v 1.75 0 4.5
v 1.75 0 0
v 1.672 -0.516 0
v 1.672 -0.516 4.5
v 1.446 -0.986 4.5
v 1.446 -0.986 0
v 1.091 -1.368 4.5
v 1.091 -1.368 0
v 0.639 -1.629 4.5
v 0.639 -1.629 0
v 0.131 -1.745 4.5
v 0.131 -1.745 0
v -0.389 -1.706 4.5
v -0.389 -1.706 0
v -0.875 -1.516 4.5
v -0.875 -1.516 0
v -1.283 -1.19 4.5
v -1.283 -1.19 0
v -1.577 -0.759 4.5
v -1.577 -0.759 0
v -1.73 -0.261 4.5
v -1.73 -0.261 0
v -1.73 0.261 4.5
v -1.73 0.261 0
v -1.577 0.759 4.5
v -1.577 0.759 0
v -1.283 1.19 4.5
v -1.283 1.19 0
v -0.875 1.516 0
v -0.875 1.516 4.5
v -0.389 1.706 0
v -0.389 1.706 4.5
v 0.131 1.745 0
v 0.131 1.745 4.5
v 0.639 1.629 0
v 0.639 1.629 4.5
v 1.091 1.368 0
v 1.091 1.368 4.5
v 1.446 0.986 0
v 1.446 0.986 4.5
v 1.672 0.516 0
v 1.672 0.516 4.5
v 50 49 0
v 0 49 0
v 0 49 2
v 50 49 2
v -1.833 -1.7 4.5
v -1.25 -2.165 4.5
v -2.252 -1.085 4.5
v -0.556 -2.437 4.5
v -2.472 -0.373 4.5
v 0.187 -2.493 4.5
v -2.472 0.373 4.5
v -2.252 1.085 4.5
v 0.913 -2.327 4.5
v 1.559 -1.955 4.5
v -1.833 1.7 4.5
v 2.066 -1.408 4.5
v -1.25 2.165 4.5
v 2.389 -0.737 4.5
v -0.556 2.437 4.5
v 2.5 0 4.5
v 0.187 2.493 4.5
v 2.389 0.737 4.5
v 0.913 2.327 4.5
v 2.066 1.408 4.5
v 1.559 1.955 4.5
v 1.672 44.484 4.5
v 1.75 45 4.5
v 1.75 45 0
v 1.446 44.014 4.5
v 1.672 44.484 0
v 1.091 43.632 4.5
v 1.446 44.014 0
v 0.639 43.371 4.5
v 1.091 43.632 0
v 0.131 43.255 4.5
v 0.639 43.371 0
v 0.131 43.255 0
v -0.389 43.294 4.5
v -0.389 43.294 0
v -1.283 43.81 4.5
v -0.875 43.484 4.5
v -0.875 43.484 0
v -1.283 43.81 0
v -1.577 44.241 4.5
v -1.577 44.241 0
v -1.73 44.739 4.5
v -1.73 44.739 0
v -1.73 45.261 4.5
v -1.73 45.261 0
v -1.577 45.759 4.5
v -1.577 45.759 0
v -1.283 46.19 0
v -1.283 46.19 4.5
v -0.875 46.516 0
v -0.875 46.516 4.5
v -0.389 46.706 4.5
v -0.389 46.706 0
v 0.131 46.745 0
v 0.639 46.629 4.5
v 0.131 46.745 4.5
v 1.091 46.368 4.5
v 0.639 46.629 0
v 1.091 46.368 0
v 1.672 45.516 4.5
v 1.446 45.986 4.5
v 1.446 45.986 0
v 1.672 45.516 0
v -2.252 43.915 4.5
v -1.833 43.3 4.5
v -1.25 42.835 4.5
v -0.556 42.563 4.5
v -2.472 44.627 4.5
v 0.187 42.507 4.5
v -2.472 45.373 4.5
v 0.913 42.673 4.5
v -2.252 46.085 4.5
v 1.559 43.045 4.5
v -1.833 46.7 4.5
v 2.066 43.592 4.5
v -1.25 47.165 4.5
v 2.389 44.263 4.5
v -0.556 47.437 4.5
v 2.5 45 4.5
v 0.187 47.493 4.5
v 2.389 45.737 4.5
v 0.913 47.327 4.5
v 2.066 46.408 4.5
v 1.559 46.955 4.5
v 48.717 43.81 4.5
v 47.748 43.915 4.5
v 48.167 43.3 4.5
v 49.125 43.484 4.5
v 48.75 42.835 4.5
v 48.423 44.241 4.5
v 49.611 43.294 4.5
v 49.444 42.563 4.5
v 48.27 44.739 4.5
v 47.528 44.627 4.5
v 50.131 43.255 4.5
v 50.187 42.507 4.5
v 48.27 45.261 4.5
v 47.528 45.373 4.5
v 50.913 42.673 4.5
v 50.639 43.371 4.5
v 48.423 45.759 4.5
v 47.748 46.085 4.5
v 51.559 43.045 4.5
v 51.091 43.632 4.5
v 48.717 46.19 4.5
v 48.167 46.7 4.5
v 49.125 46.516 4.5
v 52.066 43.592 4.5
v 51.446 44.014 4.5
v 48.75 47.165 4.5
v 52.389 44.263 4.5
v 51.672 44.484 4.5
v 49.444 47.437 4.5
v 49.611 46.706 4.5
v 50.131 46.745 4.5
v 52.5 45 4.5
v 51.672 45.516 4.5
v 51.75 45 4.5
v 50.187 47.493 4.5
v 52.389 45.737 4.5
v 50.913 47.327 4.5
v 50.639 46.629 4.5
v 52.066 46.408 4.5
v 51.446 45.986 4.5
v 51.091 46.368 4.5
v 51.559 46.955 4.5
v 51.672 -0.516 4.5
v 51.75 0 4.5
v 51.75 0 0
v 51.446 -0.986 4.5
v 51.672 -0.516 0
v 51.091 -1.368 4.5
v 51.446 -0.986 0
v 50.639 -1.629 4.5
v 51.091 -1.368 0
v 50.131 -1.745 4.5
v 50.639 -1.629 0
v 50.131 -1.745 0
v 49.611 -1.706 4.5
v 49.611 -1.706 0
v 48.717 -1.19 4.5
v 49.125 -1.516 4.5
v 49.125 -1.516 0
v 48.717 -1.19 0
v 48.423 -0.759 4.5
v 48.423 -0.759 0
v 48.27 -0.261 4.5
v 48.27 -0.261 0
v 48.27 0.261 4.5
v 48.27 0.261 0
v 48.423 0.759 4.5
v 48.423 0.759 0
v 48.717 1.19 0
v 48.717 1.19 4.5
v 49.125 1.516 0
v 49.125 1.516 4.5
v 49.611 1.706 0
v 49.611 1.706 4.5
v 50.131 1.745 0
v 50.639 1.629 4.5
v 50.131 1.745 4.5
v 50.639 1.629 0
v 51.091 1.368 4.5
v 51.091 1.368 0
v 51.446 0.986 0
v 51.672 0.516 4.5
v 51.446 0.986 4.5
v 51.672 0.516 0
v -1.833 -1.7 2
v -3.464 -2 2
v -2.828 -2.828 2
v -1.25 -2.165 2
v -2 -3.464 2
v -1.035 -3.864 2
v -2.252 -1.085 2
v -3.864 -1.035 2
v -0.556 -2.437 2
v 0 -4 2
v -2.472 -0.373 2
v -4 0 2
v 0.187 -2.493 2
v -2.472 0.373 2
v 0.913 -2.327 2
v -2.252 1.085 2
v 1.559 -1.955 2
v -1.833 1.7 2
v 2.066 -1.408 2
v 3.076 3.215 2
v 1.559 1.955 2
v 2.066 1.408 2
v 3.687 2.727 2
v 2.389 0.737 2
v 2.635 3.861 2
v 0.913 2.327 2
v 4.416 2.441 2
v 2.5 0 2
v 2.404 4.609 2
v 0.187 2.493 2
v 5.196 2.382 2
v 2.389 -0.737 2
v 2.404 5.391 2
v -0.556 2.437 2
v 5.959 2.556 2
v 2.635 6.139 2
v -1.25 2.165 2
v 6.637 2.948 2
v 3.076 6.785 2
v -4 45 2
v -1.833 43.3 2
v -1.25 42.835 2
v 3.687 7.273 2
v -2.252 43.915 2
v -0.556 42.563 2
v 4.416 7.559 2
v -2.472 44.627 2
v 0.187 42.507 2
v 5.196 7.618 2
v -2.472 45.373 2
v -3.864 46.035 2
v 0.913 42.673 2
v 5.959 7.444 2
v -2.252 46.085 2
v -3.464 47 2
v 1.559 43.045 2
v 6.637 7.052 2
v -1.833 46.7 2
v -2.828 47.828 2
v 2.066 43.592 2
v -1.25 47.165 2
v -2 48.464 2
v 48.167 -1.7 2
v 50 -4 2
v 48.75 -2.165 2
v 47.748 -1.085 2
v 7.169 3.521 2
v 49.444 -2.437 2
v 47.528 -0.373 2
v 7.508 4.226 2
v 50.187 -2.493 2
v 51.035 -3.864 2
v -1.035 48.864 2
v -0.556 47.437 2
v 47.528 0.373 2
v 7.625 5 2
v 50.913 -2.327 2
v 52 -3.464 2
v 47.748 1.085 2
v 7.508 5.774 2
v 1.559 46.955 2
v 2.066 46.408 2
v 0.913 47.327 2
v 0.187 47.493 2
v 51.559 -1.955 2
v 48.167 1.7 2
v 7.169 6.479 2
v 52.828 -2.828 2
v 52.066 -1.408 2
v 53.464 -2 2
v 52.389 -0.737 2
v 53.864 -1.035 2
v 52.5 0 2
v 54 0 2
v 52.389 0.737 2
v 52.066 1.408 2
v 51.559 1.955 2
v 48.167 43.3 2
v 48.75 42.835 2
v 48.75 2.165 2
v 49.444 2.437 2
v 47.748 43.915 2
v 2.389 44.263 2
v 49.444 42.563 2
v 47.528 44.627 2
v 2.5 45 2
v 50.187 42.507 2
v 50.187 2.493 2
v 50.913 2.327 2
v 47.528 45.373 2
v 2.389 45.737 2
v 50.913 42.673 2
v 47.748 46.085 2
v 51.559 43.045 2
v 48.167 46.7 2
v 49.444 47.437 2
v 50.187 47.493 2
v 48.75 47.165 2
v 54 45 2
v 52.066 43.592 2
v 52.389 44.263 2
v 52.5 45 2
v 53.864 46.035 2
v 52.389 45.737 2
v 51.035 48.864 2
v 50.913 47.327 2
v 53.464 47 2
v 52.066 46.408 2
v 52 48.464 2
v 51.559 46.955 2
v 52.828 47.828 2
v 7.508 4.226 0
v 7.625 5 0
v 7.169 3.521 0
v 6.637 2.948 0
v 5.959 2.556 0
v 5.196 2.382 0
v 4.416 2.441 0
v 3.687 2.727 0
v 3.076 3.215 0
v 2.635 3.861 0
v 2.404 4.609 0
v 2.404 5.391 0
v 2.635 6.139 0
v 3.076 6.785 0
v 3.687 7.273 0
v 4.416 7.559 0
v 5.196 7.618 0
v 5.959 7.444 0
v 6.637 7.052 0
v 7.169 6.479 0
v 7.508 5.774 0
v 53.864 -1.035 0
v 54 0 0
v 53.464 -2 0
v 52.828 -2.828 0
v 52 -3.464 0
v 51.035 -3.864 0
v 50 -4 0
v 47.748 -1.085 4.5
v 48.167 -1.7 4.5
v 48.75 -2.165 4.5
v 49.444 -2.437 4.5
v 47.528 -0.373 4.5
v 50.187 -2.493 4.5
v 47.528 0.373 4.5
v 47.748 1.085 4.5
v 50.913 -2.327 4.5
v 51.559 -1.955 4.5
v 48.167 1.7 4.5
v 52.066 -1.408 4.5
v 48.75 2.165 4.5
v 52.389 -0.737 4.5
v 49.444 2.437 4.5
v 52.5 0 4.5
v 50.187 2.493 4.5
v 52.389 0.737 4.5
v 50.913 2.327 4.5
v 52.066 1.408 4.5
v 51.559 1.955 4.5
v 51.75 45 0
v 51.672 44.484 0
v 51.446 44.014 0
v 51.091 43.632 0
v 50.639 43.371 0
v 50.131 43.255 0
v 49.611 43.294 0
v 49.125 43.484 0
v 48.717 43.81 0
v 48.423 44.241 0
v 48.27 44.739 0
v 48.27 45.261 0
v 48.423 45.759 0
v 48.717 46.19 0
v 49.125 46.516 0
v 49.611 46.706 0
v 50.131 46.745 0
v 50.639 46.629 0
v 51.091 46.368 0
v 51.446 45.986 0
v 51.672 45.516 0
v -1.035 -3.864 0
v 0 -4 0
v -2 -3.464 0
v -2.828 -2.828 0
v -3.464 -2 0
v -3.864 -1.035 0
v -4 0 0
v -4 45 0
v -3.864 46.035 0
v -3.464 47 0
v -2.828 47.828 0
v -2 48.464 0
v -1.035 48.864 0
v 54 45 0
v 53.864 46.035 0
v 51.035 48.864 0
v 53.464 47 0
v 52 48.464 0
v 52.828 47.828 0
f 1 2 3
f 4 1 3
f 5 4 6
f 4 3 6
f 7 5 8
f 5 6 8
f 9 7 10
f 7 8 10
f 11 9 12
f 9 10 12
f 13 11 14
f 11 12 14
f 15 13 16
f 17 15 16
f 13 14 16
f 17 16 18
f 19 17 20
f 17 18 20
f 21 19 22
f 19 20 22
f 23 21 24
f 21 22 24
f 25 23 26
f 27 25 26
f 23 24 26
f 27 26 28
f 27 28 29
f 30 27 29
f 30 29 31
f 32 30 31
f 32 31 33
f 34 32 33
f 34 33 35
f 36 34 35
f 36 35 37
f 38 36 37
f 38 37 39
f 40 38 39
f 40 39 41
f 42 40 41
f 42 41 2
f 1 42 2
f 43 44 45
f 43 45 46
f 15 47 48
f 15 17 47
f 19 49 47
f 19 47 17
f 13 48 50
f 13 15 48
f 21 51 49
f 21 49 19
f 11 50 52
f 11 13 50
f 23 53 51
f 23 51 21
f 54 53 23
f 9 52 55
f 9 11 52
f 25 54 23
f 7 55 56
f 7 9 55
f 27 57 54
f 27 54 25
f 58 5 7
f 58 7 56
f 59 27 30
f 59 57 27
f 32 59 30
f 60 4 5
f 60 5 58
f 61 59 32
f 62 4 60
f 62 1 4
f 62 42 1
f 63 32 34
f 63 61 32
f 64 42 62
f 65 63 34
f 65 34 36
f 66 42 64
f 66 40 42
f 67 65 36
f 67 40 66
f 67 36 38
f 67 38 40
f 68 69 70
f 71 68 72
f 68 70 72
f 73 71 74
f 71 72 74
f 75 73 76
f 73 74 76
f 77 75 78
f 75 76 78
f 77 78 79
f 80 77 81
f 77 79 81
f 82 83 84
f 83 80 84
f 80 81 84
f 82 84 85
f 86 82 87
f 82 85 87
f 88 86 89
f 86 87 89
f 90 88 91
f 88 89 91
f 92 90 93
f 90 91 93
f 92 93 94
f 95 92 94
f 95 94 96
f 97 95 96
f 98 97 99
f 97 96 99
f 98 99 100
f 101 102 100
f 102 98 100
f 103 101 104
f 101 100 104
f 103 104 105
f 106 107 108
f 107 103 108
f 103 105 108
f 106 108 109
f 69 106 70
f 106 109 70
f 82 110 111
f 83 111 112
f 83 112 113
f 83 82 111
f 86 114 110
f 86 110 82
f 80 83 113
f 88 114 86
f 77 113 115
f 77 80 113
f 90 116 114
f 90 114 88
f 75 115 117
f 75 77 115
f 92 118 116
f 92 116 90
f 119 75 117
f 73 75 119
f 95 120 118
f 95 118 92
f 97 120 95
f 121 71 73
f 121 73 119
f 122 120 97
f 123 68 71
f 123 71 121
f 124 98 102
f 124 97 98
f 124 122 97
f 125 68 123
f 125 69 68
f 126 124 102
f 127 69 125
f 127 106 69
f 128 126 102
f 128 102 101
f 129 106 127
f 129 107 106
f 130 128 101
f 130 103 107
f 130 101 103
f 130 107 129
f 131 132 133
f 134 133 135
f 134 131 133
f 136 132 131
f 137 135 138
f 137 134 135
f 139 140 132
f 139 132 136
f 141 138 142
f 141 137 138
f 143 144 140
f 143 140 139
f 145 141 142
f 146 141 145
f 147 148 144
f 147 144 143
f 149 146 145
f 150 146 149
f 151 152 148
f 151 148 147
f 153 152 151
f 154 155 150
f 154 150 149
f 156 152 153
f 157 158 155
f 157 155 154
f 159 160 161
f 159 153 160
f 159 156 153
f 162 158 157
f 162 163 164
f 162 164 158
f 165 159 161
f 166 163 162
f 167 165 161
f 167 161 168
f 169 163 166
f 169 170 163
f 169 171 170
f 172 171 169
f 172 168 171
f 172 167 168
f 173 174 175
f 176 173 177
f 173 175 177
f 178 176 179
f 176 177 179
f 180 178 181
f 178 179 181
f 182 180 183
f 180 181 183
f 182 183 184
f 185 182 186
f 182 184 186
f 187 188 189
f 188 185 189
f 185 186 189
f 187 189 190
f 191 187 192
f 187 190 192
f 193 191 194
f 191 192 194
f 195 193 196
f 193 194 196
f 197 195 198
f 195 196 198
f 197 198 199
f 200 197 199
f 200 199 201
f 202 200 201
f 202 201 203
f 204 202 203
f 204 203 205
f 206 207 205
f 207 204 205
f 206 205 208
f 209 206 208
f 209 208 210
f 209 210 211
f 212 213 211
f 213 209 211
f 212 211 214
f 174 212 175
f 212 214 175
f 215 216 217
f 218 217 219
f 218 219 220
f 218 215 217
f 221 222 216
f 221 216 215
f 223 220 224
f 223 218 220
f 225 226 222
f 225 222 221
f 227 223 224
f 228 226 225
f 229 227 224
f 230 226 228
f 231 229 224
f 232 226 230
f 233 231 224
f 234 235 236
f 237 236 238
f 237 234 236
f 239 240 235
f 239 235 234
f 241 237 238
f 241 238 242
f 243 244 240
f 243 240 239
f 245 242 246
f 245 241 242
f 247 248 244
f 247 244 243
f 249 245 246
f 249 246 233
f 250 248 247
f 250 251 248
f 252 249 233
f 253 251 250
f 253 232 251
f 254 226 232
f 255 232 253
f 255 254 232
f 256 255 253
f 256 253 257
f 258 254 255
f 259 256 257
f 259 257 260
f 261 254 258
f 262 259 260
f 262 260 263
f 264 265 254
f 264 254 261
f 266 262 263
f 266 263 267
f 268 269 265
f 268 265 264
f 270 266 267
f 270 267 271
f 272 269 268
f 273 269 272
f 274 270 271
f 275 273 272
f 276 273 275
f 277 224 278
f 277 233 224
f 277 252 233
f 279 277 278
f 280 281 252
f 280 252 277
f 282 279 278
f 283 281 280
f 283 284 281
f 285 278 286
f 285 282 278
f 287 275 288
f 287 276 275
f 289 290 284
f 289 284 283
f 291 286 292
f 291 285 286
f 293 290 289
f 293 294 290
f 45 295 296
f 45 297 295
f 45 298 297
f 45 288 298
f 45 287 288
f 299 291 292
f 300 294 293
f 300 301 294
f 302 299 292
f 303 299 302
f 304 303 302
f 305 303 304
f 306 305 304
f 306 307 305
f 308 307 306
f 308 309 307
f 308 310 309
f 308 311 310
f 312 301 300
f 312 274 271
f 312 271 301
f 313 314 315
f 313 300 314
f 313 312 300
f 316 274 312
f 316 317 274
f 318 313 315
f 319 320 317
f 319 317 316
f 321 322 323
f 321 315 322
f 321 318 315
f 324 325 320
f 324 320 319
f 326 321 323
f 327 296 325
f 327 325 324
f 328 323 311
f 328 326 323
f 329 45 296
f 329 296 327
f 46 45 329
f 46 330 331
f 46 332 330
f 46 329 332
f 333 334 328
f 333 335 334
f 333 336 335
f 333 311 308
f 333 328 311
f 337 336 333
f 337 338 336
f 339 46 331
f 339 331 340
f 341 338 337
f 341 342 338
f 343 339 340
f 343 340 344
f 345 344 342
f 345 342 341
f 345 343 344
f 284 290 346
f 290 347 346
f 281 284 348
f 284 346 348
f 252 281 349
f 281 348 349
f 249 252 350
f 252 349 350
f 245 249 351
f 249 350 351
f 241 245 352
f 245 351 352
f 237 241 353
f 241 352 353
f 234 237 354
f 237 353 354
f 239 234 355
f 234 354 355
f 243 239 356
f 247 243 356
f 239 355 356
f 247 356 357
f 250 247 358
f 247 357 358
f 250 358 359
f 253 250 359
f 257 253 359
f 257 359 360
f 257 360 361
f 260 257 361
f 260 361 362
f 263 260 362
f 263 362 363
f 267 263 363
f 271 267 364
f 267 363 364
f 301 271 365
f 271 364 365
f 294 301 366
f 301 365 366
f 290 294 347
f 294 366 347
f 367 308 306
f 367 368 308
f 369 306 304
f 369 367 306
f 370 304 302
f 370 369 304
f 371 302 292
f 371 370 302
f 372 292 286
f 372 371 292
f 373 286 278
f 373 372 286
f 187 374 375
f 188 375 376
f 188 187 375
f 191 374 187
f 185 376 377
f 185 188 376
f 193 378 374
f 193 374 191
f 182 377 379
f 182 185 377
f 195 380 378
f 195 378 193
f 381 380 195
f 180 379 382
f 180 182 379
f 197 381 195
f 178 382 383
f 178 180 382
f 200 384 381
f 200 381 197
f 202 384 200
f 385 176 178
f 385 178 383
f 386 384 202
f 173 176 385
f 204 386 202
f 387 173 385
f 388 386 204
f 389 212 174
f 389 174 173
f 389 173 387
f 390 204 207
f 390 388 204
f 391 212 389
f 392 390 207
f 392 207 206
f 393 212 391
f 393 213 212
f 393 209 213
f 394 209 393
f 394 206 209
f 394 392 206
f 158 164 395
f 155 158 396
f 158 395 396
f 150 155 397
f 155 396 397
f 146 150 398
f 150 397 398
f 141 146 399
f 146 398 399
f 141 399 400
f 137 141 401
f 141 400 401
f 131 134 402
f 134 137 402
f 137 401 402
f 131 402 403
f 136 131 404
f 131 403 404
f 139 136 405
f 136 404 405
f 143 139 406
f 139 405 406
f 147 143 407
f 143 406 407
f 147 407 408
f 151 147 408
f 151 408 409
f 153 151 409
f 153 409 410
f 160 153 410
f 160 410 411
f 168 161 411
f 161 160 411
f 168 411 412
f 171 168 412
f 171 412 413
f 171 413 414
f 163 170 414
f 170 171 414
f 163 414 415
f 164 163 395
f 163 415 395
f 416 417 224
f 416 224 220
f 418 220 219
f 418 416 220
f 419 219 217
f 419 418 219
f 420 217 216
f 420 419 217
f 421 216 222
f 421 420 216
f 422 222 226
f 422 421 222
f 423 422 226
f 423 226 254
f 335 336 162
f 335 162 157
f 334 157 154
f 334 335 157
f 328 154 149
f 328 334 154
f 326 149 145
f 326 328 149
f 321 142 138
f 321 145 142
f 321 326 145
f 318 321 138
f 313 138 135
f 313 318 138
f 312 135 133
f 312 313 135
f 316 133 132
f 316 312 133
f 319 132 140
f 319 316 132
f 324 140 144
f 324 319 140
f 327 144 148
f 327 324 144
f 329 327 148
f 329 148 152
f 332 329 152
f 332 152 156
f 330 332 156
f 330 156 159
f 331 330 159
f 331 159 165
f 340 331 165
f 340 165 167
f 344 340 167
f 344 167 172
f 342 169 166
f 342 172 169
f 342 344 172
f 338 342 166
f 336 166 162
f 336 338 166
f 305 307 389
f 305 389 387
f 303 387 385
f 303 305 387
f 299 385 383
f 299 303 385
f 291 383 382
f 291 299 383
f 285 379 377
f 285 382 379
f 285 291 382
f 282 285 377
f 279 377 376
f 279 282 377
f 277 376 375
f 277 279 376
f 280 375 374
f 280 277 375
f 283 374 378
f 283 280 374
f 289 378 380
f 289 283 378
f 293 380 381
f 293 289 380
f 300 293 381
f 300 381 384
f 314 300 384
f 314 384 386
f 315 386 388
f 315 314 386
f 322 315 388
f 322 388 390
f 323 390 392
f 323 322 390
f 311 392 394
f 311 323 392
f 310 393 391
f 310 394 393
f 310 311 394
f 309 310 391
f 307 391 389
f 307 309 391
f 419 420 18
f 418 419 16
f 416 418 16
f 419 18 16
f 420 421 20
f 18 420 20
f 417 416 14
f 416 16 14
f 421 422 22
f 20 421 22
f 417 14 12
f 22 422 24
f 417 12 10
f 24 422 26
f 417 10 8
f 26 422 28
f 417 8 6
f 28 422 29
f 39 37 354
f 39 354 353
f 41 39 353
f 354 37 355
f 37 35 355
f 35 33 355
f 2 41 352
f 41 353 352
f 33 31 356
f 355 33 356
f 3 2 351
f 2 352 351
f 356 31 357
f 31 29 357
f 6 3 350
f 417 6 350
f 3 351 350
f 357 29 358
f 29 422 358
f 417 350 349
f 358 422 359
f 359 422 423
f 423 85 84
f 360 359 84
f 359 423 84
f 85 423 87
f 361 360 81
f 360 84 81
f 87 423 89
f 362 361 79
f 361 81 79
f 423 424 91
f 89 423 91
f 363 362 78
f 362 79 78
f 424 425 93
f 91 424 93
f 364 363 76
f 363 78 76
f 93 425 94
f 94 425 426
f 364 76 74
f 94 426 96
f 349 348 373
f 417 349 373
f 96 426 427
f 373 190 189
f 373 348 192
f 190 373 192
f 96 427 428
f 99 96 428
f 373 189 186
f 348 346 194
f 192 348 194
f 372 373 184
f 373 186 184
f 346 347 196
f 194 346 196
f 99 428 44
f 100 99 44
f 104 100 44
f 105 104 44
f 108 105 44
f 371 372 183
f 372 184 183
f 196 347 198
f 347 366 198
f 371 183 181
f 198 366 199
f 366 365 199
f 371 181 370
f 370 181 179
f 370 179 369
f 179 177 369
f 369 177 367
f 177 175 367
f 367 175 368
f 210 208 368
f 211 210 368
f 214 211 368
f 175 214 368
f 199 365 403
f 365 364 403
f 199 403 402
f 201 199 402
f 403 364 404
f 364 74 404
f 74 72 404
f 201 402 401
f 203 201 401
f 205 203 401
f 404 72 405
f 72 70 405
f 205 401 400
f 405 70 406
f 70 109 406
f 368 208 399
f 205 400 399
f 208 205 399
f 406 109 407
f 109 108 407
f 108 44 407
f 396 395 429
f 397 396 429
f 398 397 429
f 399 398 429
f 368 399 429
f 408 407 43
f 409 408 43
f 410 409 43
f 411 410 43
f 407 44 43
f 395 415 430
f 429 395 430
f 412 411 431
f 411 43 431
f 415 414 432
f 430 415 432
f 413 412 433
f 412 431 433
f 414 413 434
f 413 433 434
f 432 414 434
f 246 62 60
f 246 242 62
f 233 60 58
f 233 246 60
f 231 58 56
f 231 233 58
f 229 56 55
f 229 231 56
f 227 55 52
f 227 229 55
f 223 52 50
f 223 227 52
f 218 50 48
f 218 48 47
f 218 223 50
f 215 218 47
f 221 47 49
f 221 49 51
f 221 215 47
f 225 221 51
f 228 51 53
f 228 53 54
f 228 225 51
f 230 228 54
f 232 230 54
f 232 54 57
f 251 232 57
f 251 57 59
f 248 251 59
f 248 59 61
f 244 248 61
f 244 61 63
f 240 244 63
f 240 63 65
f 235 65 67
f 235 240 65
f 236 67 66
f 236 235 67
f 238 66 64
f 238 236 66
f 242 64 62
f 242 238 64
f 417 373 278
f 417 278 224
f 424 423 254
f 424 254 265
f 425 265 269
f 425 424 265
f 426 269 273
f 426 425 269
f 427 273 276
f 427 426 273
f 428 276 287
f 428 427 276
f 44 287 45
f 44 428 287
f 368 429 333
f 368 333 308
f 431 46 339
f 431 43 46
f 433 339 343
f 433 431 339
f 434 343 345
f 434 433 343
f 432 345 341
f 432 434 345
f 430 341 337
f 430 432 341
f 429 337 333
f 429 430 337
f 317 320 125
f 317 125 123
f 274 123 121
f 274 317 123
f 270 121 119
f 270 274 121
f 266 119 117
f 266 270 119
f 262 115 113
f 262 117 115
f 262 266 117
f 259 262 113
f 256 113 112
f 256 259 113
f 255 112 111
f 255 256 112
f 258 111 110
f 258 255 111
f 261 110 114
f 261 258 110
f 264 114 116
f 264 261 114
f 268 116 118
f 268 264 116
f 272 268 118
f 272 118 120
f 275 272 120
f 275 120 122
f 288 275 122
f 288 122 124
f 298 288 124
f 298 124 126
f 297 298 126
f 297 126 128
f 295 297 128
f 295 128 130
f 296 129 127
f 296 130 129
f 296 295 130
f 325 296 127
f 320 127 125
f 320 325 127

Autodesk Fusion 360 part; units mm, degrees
sketch "Sketch1" plane through (0, 0, 0) normal (0, 0, 1) x (1, 0, 0)
  circle A0 centre (0, 45) radius 1.75
  circle A1 centre (50, 45) radius 1.75
  circle A2 centre (0, 0) radius 1.75
  circle A3 centre (50, 0) radius 1.75
  line L0 (54, 45) -> (54, 0)
  line L1 (-4, 0) -> (-4, 45)
  line L2 (0, 49) -> (50, 49)
  line L3 (50, -4) -> (0, -4)
  line L4 (-1.75, 45) -> (1.75, 45)
  line L5 (48.25, 45) -> (51.75, 45)
  line L6 (50, 45) -> (48.25, 45)
  line L7 (1.75, 45) -> (0, 45)
  line L8 (0, -1.75) -> (0, 1.75)
  line L9 (0, 43.25) -> (0, 46.75)
  line L10 (0, 45) -> (0, 43.25)
  line L11 (0, 1.75) -> (0, 0)
  arc A4 (0, 49) -> (-4, 44.9977) centre (0, 45) ccw
  line L12 (50, 46.75) -> (50, 43.25)
  line L13 (50, 1.75) -> (50, -1.75)
  line L14 (50, 0) -> (50, 1.75)
  line L15 (50, 43.25) -> (50, 45)
  arc A5 (54, 45) -> (50, 49) centre (50, 45) ccw
  arc A6 (50, -4) -> (54, 0) centre (50, 0) ccw
  line L16 (0, 0) -> (1.75, 0)
  line L17 (48.25, 0) -> (50, 0)
  line L18 (51.75, 0) -> (48.25, 0)
  line L19 (1.75, 0) -> (-1.75, 0)
  arc A7 (-4, 0) -> (0, -4) centre (0, 0) ccw
  circle A8 centre (0, 0) radius 2.5
  circle A9 centre (0, 45) radius 2.5
  circle A10 centre (50, 45) radius 2.5
  circle A11 centre (50, 0) radius 2.5
  line L20 (0, 0) -> (5, 0)
  line L21 (5, 0) -> (5, 5)
  line L22 (5, 5) -> (0, 5)
  line L23 (0, 5) -> (0, 0)
  circle A12 centre (5, 5) radius 2.625
  dimension "d1" = 50
  dimension "d2" = 45
  dimension "d3" = 3.5
  dimension "d4" = 3.5
  dimension "d5" = 3.5
  dimension "d6" = 3.5
  dimension "d7" = 8
  dimension "d9" = 8
  dimension "d10" = 8
  dimension "d11" = 5
  dimension "d12" = 5
  dimension "d13" = 5
  dimension "d14" = 5
  dimension "d19" = 5
  dimension "d20" = 5.25
extrude "Extrude1" add sketch "Sketch1" along normal blind 2 contours A8 L20 L21 L22 L23 A12 | L21 L22 A12 | L21 L22 A12 | L0 L1 L2 L3 A4 A5 A6 A7
extrude "Extrude2" add sketch "Sketch1" along normal blind 4.5 contours A2 A8 L20 L23 | A2 A8 L20 L23 | A9 | A10 | A11
extrude "Extrude3" cut sketch "Sketch1" along normal blind 10 contours L21 L22 A12 | L21 L22 A12
